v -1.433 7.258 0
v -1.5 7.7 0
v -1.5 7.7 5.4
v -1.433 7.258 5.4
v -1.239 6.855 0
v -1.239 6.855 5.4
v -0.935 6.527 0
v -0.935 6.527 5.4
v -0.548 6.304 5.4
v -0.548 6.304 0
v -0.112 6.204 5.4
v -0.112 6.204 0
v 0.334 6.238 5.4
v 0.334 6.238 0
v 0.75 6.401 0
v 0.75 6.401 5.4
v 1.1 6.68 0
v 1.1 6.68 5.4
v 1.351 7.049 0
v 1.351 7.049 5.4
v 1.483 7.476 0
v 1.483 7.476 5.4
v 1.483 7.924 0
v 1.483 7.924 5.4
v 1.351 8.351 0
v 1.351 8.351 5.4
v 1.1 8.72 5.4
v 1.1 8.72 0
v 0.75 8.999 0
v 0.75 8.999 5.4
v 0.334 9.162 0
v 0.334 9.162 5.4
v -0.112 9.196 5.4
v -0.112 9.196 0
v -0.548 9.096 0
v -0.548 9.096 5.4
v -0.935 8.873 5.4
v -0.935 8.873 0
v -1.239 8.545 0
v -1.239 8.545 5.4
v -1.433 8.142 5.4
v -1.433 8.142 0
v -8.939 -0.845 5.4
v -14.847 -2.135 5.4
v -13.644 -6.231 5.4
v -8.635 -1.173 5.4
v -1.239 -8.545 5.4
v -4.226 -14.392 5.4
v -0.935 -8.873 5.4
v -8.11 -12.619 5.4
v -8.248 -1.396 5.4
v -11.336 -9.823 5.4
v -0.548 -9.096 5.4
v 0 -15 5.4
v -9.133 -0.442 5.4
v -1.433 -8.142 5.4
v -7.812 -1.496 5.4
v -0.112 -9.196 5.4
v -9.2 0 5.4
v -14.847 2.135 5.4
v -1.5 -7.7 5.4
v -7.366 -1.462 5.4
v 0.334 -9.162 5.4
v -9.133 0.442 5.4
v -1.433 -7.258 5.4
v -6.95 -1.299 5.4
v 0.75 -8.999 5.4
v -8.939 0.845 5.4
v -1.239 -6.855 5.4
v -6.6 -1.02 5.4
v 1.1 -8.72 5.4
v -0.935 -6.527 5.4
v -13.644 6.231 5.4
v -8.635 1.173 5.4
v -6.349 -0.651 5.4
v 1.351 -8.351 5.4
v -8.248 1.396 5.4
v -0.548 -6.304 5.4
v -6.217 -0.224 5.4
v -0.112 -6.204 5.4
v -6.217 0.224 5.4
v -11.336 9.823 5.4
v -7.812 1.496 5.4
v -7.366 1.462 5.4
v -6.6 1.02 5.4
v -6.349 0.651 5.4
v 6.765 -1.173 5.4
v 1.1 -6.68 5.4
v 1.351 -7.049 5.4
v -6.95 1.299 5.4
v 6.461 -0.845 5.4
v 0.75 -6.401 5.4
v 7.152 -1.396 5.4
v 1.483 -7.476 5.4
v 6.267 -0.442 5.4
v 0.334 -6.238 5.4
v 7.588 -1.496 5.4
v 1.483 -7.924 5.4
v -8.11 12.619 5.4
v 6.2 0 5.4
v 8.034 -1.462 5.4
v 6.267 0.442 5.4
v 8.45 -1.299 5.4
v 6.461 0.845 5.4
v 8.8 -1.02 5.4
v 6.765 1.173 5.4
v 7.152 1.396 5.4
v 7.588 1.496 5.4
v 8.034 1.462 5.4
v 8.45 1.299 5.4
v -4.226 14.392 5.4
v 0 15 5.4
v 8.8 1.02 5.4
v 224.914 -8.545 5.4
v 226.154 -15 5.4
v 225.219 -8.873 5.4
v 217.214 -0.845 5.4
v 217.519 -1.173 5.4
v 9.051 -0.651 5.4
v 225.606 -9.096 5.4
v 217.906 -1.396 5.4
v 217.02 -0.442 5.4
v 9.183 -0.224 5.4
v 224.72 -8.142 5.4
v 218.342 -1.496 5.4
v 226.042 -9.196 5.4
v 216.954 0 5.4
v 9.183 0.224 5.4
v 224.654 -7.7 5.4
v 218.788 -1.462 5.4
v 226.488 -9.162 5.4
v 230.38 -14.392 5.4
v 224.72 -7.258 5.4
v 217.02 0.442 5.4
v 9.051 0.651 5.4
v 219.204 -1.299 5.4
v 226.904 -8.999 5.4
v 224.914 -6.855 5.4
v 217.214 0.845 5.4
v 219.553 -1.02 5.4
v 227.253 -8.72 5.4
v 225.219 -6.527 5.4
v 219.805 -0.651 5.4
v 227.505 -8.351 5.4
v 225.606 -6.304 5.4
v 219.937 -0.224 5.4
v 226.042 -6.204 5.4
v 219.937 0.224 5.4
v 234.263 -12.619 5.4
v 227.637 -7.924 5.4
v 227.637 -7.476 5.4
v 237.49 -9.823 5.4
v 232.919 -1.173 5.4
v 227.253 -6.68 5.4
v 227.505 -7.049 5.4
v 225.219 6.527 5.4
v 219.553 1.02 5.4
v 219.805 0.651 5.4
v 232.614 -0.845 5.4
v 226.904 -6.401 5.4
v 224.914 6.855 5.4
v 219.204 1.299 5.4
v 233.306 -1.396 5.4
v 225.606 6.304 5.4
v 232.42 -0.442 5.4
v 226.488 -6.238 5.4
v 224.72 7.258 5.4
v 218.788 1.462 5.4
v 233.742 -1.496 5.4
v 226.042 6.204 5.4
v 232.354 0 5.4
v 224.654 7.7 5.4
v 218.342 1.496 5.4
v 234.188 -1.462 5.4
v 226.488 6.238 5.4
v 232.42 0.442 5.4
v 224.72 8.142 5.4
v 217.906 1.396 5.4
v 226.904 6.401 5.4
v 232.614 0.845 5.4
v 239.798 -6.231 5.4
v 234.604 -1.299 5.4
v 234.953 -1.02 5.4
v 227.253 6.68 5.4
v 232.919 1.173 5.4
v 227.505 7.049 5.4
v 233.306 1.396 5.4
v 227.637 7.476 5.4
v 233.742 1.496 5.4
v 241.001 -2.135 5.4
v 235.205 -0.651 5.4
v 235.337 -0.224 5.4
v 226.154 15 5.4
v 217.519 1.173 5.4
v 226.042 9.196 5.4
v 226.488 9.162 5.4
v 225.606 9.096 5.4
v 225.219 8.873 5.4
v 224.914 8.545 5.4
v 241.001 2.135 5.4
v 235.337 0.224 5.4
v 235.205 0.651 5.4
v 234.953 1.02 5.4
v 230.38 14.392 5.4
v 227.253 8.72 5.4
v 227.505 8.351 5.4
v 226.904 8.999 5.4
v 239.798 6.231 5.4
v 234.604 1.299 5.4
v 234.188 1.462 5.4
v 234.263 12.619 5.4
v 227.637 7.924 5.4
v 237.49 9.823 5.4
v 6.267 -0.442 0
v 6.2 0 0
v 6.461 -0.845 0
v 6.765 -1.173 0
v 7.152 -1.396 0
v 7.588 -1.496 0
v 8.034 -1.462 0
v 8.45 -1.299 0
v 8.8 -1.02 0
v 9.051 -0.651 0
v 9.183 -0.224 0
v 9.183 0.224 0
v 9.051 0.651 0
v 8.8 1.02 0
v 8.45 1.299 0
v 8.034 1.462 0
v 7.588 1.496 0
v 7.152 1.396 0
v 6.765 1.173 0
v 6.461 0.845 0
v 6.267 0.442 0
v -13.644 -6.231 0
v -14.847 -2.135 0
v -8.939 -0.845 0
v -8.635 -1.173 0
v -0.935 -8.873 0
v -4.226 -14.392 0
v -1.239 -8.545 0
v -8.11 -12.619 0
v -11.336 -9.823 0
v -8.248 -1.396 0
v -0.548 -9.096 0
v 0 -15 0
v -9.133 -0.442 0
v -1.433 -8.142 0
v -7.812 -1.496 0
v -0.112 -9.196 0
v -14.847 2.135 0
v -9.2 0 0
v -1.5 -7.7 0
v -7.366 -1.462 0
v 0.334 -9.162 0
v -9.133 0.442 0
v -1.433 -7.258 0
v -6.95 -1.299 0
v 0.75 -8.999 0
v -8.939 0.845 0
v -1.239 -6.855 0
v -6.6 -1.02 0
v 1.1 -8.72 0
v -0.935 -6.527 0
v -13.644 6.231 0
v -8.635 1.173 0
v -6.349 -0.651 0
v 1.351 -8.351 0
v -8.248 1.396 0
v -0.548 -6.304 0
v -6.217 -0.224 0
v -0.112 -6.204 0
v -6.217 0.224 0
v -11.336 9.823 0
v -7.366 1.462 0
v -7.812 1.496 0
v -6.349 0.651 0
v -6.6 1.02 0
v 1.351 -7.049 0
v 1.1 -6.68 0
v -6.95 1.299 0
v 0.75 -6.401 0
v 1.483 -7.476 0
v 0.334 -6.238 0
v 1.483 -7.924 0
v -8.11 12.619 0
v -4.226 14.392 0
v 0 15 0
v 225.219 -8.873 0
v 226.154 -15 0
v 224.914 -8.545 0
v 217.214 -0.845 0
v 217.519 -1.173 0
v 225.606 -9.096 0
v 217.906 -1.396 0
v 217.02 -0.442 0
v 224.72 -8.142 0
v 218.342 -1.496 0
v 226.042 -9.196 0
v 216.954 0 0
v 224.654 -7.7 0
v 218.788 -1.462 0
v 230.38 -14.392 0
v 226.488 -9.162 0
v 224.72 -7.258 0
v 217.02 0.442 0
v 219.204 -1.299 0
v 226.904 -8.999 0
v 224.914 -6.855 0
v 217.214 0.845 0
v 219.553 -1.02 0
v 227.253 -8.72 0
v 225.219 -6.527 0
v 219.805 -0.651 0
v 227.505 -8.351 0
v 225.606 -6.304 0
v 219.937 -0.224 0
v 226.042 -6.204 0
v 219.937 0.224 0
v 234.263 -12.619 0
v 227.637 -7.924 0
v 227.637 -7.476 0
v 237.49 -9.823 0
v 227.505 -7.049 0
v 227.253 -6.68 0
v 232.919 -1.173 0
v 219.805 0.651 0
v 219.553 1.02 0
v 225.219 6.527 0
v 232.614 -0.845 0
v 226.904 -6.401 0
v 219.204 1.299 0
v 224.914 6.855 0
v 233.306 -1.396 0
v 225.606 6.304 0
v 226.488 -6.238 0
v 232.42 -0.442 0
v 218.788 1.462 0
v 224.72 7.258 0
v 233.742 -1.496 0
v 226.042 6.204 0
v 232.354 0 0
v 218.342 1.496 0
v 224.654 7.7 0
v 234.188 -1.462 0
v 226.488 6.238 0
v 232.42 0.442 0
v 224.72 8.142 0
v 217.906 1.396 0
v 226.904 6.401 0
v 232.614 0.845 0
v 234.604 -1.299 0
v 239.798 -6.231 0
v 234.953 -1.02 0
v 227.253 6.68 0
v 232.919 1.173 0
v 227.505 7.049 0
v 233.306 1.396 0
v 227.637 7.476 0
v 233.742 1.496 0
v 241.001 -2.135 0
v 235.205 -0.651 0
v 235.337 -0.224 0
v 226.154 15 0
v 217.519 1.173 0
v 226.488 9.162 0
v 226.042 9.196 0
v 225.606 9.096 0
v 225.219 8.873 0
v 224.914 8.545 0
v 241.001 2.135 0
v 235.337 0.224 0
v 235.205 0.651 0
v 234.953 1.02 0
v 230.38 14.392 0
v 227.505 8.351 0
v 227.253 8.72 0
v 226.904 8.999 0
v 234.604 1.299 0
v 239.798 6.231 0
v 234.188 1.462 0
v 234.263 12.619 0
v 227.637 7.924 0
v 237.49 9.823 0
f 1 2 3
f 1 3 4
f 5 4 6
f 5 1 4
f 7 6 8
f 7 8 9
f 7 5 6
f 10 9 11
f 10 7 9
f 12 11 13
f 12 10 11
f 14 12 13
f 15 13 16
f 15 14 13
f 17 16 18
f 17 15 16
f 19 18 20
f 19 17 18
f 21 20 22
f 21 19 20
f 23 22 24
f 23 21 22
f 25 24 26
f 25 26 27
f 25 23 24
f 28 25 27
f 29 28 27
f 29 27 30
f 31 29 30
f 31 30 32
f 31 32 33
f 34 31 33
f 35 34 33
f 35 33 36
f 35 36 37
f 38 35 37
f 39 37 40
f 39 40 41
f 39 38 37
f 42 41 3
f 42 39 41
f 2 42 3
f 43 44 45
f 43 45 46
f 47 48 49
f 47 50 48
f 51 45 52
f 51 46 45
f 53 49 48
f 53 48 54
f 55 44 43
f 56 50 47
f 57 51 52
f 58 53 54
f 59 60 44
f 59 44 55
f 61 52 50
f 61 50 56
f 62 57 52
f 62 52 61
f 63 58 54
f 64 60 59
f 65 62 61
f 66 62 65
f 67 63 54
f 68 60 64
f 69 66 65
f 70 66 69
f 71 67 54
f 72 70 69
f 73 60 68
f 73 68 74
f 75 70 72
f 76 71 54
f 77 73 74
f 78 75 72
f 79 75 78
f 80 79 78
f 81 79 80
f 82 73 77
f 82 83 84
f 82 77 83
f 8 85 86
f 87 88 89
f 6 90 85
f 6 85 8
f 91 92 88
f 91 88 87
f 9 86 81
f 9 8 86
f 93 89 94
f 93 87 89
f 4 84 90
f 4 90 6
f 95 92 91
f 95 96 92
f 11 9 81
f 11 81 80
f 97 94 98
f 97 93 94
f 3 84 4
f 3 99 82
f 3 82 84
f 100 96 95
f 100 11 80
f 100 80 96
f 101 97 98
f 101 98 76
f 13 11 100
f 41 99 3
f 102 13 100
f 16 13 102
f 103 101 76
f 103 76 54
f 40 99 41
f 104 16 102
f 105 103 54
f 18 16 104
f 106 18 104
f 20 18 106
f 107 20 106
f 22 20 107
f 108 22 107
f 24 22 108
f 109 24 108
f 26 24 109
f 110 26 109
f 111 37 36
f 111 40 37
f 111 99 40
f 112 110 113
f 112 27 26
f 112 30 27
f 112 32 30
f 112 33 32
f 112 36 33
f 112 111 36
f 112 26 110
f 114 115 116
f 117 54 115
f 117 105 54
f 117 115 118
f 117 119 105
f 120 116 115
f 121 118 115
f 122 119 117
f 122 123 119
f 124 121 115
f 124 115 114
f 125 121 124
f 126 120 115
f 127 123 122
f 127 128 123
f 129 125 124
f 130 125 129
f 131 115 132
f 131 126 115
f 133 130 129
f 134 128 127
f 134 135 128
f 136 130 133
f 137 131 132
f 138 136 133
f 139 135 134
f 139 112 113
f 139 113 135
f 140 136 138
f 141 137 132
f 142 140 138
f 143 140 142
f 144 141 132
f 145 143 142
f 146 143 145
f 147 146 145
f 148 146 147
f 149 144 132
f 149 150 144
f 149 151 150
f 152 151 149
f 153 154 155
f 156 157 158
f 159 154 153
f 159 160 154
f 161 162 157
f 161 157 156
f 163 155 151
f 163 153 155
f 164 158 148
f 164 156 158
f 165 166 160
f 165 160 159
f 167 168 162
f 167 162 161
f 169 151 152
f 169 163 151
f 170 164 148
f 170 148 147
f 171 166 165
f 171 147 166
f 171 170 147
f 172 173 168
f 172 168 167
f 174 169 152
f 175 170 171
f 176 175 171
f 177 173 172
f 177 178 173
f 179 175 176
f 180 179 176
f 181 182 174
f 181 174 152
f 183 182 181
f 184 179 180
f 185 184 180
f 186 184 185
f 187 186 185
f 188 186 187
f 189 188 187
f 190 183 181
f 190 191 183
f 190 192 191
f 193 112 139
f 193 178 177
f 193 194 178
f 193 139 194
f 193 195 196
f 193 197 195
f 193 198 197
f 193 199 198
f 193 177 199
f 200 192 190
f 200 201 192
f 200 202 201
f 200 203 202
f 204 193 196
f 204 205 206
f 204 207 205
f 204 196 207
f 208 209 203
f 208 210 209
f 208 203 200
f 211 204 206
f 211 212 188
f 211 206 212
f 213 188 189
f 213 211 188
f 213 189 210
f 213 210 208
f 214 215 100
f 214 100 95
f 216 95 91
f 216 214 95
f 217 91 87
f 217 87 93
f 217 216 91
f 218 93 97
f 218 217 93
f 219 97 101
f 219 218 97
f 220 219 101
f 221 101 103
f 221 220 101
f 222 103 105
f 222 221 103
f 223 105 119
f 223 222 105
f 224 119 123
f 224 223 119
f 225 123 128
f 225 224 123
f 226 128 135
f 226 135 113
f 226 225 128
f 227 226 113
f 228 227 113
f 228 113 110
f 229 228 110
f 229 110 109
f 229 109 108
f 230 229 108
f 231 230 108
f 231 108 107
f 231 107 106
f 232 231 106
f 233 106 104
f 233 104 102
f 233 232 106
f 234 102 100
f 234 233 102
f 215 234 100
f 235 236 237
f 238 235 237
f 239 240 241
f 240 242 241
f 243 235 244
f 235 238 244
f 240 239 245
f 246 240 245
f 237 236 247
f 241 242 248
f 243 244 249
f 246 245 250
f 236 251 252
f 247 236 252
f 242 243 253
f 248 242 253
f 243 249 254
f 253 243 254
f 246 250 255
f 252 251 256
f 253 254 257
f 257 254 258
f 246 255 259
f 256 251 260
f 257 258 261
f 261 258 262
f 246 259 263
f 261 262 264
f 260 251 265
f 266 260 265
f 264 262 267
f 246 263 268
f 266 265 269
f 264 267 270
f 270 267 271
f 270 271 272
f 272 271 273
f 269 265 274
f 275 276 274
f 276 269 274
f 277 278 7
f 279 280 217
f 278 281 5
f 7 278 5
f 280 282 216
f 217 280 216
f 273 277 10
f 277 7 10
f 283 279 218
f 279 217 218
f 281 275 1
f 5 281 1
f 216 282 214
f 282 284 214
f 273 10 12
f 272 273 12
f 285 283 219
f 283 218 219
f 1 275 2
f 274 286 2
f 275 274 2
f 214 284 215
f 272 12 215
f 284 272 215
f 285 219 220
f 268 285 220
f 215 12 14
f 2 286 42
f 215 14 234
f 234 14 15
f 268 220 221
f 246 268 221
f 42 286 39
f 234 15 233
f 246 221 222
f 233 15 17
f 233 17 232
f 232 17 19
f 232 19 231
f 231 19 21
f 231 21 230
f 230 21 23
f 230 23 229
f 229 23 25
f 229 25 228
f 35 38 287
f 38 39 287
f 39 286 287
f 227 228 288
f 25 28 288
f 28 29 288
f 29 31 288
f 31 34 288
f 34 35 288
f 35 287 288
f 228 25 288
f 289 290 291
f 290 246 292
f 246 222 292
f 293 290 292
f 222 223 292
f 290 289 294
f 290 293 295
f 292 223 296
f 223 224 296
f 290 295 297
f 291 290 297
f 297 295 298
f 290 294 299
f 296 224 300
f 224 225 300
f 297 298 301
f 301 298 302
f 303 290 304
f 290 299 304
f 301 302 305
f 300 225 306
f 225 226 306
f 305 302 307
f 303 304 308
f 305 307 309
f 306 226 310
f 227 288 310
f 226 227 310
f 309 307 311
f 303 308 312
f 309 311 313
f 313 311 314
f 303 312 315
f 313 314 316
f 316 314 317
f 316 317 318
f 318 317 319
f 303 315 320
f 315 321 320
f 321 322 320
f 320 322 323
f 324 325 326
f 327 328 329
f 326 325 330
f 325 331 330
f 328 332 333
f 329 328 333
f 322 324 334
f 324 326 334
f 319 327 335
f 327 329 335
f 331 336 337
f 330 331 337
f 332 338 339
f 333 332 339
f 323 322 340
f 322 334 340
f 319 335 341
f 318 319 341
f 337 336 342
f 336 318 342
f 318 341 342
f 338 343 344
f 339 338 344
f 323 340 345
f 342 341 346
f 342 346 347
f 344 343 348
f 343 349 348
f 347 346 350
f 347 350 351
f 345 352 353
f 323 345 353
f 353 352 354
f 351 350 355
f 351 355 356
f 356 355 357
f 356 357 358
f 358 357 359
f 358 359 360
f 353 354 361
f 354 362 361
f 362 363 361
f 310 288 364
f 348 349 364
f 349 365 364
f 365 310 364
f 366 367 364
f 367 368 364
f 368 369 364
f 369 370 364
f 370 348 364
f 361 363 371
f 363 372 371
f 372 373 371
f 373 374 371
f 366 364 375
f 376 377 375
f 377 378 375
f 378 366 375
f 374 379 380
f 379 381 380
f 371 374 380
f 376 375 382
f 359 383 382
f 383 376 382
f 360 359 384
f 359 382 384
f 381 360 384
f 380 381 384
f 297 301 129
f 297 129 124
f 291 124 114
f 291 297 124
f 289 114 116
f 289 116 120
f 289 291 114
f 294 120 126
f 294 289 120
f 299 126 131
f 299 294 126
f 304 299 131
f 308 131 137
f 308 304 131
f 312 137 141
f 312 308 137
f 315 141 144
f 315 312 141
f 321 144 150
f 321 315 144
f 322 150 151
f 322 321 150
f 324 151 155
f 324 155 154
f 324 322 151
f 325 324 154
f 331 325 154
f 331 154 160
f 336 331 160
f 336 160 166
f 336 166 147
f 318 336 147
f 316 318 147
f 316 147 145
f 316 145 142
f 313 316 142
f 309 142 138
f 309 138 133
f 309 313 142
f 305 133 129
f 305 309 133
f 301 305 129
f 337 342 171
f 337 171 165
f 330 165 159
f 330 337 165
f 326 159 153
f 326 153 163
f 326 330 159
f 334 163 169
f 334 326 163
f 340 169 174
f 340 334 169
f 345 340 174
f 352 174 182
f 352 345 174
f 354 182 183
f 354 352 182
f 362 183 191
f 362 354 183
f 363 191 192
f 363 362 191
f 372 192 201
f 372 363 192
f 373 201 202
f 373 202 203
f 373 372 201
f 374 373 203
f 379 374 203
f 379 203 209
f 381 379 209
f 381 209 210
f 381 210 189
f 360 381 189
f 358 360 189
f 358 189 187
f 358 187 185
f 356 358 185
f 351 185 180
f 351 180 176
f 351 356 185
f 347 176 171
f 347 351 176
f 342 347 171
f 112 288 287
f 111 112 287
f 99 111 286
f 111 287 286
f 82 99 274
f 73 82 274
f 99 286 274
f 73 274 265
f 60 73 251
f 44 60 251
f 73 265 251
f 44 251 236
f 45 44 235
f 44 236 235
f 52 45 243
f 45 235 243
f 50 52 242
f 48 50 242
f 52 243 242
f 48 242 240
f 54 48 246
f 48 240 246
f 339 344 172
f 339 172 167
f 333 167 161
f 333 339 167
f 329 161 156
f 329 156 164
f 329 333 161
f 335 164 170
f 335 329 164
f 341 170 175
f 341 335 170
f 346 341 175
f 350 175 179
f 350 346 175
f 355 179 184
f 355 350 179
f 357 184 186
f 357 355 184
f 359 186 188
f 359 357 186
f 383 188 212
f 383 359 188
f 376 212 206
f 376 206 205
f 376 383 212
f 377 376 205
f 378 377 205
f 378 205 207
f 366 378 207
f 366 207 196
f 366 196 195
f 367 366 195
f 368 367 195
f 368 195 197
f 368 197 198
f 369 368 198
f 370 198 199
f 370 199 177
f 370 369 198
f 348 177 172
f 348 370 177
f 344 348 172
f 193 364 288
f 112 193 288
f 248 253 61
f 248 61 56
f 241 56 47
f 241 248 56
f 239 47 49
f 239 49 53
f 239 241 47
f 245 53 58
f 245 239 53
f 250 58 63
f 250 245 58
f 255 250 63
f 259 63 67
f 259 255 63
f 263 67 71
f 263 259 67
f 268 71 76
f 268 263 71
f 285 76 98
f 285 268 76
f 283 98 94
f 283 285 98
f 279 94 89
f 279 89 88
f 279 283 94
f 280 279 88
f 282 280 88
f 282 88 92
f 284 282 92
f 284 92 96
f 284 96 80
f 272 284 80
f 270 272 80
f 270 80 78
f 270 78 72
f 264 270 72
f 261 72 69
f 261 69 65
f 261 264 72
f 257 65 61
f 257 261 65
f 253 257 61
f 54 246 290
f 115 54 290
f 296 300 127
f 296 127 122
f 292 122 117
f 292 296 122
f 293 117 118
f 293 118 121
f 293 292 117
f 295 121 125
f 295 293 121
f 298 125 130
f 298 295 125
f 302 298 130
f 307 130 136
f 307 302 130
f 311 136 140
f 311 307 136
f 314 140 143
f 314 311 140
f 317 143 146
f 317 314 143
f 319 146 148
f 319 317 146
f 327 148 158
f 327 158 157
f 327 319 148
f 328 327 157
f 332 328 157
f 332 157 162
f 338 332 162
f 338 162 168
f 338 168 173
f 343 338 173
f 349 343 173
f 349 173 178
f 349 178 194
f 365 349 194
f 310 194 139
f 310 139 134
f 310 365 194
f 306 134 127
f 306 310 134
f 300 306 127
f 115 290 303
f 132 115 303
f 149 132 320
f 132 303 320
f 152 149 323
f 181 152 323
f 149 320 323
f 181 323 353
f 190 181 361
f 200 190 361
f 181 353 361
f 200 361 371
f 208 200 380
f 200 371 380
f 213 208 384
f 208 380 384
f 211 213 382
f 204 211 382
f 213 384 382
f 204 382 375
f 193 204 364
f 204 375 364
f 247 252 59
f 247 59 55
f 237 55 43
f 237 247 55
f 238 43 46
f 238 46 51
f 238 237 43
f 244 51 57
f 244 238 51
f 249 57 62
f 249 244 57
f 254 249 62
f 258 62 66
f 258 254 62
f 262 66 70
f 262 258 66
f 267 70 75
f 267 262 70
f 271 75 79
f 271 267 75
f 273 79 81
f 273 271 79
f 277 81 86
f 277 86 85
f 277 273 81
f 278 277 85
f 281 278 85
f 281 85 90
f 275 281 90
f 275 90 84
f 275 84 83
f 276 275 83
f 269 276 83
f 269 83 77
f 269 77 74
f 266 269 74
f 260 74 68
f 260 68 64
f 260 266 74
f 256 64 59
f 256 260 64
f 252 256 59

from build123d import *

# Parameters (mm, degrees)
SKETCH1_R           = 1.5
BOSS_EXTRUDE1_DEPTH = 5.4


with BuildPart() as part:
    # Sketch1 → Boss-Extrude1 (new body)
    with BuildSketch(Plane.XY):
        with BuildLine():
            Line((0, -15), (226.153846154, -15))
            ThreePointArc((226.153846154, -15), (241.153846154, 0), (226.153846154, 15))
            Line((226.153846154, 15), (0, 15))
            ThreePointArc((0, 15), (-15, 0), (0, -15))
        make_face()
        with Locations((0, 7.7)):
            Circle(SKETCH1_R, mode=Mode.SUBTRACT)
        with Locations((7.7, 0)):
            Circle(SKETCH1_R, mode=Mode.SUBTRACT)
        with Locations((0, -7.7)):
            Circle(SKETCH1_R, mode=Mode.SUBTRACT)
        with Locations((-7.7, 0)):
            Circle(SKETCH1_R, mode=Mode.SUBTRACT)
        with Locations((218.453846154, 0)):
            Circle(SKETCH1_R, mode=Mode.SUBTRACT)
        with Locations((226.153846154, -7.7)):
            Circle(SKETCH1_R, mode=Mode.SUBTRACT)
        with Locations((233.853846154, 0)):
            Circle(SKETCH1_R, mode=Mode.SUBTRACT)
        with Locations((226.153846154, 7.7)):
            Circle(SKETCH1_R, mode=Mode.SUBTRACT)
    extrude(amount=BOSS_EXTRUDE1_DEPTH)


solid = part.part
